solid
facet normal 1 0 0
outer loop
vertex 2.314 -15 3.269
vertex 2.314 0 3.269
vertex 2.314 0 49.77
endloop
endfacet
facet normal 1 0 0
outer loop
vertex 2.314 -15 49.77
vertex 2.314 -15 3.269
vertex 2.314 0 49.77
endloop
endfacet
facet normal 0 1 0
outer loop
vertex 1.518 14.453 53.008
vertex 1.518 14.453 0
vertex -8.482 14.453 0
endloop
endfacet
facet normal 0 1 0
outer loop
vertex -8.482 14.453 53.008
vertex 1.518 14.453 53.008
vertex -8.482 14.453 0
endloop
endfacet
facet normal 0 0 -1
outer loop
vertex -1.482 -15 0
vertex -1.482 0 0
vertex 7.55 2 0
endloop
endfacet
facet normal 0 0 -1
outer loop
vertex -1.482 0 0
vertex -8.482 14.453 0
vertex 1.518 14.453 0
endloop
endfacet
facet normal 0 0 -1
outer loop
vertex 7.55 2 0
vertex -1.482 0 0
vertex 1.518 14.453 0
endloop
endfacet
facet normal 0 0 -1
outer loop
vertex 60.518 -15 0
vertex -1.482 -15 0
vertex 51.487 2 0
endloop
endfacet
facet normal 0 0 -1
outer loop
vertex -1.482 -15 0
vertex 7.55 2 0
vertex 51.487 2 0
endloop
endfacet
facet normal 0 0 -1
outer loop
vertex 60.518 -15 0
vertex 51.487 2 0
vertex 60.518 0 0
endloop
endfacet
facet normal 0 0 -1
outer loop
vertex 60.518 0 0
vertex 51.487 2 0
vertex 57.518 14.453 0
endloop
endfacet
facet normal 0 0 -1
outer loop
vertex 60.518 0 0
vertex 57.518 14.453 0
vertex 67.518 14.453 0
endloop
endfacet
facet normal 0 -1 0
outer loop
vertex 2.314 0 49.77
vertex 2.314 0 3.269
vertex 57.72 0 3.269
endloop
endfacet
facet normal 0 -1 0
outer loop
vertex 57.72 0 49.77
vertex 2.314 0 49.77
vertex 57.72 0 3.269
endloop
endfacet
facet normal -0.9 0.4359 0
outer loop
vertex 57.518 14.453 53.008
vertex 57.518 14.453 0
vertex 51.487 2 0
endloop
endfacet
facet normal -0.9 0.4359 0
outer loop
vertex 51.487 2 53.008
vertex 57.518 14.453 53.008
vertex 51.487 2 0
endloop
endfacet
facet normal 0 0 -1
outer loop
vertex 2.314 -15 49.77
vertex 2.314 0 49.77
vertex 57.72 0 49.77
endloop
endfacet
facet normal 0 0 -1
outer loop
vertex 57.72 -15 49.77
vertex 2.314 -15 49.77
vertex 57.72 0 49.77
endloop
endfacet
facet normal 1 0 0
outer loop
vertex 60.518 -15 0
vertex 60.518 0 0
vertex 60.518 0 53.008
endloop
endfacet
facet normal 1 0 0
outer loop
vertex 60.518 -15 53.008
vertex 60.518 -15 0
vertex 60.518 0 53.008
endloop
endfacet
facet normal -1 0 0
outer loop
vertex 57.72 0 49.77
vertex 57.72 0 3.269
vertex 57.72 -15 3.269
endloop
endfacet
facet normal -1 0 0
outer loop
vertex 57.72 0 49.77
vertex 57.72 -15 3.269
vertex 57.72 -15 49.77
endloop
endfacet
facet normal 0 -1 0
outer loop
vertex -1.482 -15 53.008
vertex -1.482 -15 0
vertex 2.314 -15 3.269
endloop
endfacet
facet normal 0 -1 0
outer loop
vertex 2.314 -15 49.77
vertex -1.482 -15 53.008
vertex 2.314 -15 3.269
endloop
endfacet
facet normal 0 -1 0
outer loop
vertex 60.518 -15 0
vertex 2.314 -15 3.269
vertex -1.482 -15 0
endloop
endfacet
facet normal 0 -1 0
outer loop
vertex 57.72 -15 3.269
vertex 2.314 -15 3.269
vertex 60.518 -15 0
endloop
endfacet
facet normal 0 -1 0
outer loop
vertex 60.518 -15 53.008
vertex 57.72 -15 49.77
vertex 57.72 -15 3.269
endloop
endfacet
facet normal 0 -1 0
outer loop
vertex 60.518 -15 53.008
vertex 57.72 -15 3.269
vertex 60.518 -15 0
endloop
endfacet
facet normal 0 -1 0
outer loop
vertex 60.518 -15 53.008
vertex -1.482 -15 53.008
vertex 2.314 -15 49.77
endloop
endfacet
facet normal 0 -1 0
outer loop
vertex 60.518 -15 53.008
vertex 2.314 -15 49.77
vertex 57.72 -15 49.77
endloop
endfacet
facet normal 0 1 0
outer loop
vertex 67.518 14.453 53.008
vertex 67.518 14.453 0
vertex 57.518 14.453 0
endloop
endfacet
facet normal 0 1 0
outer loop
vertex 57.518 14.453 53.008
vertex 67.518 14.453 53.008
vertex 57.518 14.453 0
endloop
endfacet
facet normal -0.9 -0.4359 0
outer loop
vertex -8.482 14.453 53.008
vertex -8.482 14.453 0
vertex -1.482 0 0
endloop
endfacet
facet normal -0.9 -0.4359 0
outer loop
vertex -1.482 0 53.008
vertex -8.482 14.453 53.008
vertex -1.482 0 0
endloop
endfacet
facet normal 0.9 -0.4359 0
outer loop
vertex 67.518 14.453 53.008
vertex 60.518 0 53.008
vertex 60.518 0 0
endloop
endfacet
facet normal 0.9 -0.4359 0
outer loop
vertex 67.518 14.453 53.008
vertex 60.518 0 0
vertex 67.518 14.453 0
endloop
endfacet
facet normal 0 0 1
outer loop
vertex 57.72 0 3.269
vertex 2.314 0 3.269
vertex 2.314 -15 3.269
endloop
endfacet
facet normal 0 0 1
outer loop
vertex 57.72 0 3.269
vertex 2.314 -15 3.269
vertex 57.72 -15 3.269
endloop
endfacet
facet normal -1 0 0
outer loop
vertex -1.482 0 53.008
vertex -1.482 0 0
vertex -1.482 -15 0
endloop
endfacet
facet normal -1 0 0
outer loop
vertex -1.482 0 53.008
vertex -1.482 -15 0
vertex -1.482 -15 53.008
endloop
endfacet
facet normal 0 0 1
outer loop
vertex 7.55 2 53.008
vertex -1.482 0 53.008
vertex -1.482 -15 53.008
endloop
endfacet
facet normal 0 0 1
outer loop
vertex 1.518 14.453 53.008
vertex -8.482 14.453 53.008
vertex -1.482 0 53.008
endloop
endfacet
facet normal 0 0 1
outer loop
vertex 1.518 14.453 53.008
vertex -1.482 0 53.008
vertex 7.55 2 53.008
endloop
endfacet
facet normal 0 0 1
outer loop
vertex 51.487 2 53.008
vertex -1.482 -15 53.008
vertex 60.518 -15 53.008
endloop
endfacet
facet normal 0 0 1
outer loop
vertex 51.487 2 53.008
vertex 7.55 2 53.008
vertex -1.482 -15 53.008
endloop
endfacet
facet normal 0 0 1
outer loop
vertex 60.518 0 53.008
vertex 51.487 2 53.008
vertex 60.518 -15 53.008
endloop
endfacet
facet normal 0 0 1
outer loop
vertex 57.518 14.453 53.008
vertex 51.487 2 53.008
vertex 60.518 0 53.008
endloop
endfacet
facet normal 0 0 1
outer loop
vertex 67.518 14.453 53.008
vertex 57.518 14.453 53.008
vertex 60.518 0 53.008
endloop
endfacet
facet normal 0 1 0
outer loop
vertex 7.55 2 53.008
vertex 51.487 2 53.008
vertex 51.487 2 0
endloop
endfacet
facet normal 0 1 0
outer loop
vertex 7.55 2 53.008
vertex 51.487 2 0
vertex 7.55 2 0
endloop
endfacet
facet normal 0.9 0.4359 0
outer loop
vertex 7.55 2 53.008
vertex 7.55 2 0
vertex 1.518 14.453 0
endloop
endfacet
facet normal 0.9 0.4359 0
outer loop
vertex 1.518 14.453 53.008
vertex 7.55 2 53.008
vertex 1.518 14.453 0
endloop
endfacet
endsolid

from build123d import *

# Parameters (mm, degrees)
F1_DEPTH = 53.007968
F2_W     = 62
F2_H     = 53.007968
F2_W_2   = 55.406839
F2_H_2   = 46.501182
F3_DEPTH = 15


with BuildPart() as f1:
    # F0 (on Top) → F1 (new body)
    with BuildSketch(Plane.XY):
        Polygon((-1.481589, 0), (0, 0), (60.518411, 0), (67.518411, 14.453191), (57.518411, 14.453191), (51.487055, 2), (7.549767, 2), (1.518411, 14.453191), (-8.481589, 14.453191), align=None)
    extrude(amount=F1_DEPTH)

    # F2 (on face) → F3 (join)
    with BuildSketch(Plane.XZ):
        with Locations((29.518411, 26.503984)):
            Rectangle(F2_W, F2_H)
        with Locations((30.017025, 26.519272)):
            Rectangle(F2_W_2, F2_H_2, mode=Mode.SUBTRACT)
    extrude(amount=F3_DEPTH)


solid = f1.part
